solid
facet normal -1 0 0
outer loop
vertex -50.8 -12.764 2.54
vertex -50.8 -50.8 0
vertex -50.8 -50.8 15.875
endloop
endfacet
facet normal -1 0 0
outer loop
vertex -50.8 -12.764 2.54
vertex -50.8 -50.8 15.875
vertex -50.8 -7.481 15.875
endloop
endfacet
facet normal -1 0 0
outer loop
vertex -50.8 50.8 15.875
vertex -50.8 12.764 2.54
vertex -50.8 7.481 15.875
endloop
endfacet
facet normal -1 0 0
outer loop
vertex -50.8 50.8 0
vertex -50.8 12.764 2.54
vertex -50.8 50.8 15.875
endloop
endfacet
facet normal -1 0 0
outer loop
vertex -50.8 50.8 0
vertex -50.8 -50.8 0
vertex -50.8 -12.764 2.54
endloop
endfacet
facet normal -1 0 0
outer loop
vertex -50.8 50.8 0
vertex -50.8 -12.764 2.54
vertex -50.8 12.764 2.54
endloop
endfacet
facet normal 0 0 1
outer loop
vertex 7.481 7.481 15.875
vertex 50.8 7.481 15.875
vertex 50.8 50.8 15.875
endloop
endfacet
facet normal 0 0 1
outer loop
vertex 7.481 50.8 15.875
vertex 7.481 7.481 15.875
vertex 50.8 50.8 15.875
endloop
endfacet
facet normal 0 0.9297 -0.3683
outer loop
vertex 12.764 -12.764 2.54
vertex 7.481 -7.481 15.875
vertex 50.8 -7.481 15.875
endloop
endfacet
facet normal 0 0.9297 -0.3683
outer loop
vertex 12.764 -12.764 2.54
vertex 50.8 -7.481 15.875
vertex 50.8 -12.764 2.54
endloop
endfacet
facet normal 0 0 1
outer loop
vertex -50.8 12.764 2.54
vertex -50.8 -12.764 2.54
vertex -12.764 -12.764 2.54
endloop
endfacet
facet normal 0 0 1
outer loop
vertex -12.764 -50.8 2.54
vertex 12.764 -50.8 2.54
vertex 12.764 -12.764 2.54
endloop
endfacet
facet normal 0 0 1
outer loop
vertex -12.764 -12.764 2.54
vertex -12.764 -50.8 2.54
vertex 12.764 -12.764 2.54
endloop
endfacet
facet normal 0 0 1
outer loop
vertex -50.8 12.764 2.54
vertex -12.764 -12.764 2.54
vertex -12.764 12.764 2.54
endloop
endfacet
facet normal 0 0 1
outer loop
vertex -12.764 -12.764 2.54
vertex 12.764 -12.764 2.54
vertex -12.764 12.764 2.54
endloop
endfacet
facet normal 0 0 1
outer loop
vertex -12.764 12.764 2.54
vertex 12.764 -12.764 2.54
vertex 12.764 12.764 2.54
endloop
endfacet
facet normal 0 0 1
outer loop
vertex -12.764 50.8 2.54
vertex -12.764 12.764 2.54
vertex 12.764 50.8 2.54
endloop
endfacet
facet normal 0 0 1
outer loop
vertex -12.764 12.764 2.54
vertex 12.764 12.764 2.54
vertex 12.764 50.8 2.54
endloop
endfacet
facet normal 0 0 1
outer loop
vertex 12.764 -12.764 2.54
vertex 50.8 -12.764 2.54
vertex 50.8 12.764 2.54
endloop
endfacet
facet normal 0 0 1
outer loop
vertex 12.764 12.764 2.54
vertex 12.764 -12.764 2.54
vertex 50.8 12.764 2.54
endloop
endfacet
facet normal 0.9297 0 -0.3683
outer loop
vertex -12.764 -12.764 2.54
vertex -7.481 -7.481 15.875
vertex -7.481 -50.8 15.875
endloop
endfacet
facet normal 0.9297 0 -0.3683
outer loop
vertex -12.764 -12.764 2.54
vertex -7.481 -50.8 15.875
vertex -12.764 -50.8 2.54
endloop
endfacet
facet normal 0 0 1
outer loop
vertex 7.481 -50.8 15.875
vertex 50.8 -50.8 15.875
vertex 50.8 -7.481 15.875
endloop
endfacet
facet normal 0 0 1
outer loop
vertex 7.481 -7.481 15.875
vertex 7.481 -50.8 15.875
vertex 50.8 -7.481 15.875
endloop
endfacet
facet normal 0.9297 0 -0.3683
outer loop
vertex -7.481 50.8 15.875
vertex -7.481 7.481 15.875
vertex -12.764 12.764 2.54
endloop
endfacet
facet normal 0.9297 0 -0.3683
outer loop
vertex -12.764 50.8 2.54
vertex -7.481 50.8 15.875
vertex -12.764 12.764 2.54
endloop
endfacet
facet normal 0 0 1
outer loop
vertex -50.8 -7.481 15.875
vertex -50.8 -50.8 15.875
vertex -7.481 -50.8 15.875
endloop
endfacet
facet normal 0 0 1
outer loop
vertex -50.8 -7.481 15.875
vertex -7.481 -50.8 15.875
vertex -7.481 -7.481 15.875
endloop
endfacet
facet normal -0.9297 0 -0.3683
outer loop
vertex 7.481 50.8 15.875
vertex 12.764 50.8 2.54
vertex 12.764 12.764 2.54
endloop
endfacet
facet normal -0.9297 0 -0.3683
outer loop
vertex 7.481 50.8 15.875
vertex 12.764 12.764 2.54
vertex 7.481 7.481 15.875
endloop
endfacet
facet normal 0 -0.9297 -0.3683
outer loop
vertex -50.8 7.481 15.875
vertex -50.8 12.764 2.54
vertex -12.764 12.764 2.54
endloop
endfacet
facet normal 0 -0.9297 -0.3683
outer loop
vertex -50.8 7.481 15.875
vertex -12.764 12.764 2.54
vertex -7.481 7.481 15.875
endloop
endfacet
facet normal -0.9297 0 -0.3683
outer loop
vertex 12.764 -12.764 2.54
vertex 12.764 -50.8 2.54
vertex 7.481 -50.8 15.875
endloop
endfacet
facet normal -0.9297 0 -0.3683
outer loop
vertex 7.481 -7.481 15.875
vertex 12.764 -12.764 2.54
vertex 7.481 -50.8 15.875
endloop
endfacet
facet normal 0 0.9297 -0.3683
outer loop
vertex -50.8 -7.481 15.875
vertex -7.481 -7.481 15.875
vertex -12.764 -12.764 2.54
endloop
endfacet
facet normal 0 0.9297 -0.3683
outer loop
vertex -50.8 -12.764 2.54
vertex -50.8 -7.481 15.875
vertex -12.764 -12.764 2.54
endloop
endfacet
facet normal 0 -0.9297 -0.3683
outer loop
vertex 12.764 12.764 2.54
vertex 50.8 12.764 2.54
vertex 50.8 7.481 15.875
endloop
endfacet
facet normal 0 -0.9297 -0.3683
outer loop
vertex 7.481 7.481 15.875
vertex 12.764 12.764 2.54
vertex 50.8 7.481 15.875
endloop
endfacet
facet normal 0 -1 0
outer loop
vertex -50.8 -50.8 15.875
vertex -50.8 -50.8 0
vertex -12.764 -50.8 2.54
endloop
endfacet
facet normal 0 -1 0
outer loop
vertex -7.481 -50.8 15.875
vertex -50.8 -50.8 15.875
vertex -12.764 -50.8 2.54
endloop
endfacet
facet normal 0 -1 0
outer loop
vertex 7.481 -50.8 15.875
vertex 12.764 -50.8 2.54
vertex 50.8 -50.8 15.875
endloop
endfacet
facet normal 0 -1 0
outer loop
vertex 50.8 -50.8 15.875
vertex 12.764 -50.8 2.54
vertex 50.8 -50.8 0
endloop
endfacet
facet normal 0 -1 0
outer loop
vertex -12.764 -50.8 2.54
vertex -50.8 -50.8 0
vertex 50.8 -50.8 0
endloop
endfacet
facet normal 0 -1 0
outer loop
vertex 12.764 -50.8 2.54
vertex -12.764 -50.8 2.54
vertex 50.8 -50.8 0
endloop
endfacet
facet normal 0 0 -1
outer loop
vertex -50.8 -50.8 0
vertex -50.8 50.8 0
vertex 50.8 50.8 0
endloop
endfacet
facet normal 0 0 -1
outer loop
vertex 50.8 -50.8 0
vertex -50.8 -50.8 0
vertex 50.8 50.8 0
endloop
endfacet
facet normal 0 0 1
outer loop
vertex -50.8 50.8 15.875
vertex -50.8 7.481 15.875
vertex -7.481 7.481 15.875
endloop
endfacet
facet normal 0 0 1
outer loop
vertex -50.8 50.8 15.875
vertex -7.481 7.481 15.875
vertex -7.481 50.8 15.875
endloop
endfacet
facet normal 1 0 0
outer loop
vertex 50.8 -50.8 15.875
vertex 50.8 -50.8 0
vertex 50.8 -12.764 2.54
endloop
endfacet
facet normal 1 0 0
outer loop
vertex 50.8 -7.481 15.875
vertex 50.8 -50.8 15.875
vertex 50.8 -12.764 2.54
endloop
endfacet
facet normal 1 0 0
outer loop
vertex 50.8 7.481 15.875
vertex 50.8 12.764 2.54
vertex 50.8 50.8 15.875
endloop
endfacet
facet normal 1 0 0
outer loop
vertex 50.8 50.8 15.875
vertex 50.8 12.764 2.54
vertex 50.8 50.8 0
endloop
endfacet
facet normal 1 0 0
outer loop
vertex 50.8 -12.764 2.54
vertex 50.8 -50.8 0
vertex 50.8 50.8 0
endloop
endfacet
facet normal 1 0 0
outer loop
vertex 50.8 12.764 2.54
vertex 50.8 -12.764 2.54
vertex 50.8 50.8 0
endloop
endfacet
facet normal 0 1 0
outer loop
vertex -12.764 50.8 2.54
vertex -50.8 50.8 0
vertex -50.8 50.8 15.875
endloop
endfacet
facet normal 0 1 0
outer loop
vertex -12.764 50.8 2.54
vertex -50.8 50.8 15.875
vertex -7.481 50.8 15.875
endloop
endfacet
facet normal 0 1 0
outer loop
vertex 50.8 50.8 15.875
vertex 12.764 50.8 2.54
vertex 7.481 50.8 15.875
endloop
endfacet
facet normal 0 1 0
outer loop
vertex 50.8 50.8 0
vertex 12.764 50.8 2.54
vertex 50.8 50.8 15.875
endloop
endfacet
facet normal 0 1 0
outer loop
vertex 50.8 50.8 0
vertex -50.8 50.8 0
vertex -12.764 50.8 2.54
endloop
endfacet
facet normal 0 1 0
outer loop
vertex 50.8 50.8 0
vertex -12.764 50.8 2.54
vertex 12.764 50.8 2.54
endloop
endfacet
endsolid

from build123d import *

# Parameters (mm, degrees)
F0_W     = 101.6
F0_H     = 101.6
F1_DEPTH = 19.05
F3_DEPTH = 101.601
F5_DEPTH = 101.601
F6_W     = 101.6
F6_H     = 3.175
F7_DEPTH = 101.601


with BuildPart() as f1:
    # F0 (on Top) → F1 (new body)
    with BuildSketch(Plane.XY):
        Rectangle(F0_W, F0_H)
    extrude(amount=F1_DEPTH)

    # F2 (on face) → F3 (cut, through all)
    with BuildSketch(Plane.YZ.offset(50.8)):
        Polygon((6.223, 19.05), (-6.223, 19.05), (-12.7635, 2.54), (12.7635, 2.54), align=None)
    extrude(amount=-F3_DEPTH, mode=Mode.SUBTRACT)

    # F4 (on face) → F5 (cut, through all)
    with BuildSketch(Plane.XZ.offset(50.8)):
        Polygon((6.223, 19.05), (-6.223, 19.05), (-12.7635, 2.54), (12.7635, 2.54), align=None)
    extrude(amount=-F5_DEPTH, mode=Mode.SUBTRACT)

    # F6 (on face) → F7 (cut, through all)
    with BuildSketch(Plane.YZ.offset(50.8)):
        with Locations((0, 17.4625)):
            Rectangle(F6_W, F6_H)
    extrude(amount=-F7_DEPTH, mode=Mode.SUBTRACT)


solid = f1.part
